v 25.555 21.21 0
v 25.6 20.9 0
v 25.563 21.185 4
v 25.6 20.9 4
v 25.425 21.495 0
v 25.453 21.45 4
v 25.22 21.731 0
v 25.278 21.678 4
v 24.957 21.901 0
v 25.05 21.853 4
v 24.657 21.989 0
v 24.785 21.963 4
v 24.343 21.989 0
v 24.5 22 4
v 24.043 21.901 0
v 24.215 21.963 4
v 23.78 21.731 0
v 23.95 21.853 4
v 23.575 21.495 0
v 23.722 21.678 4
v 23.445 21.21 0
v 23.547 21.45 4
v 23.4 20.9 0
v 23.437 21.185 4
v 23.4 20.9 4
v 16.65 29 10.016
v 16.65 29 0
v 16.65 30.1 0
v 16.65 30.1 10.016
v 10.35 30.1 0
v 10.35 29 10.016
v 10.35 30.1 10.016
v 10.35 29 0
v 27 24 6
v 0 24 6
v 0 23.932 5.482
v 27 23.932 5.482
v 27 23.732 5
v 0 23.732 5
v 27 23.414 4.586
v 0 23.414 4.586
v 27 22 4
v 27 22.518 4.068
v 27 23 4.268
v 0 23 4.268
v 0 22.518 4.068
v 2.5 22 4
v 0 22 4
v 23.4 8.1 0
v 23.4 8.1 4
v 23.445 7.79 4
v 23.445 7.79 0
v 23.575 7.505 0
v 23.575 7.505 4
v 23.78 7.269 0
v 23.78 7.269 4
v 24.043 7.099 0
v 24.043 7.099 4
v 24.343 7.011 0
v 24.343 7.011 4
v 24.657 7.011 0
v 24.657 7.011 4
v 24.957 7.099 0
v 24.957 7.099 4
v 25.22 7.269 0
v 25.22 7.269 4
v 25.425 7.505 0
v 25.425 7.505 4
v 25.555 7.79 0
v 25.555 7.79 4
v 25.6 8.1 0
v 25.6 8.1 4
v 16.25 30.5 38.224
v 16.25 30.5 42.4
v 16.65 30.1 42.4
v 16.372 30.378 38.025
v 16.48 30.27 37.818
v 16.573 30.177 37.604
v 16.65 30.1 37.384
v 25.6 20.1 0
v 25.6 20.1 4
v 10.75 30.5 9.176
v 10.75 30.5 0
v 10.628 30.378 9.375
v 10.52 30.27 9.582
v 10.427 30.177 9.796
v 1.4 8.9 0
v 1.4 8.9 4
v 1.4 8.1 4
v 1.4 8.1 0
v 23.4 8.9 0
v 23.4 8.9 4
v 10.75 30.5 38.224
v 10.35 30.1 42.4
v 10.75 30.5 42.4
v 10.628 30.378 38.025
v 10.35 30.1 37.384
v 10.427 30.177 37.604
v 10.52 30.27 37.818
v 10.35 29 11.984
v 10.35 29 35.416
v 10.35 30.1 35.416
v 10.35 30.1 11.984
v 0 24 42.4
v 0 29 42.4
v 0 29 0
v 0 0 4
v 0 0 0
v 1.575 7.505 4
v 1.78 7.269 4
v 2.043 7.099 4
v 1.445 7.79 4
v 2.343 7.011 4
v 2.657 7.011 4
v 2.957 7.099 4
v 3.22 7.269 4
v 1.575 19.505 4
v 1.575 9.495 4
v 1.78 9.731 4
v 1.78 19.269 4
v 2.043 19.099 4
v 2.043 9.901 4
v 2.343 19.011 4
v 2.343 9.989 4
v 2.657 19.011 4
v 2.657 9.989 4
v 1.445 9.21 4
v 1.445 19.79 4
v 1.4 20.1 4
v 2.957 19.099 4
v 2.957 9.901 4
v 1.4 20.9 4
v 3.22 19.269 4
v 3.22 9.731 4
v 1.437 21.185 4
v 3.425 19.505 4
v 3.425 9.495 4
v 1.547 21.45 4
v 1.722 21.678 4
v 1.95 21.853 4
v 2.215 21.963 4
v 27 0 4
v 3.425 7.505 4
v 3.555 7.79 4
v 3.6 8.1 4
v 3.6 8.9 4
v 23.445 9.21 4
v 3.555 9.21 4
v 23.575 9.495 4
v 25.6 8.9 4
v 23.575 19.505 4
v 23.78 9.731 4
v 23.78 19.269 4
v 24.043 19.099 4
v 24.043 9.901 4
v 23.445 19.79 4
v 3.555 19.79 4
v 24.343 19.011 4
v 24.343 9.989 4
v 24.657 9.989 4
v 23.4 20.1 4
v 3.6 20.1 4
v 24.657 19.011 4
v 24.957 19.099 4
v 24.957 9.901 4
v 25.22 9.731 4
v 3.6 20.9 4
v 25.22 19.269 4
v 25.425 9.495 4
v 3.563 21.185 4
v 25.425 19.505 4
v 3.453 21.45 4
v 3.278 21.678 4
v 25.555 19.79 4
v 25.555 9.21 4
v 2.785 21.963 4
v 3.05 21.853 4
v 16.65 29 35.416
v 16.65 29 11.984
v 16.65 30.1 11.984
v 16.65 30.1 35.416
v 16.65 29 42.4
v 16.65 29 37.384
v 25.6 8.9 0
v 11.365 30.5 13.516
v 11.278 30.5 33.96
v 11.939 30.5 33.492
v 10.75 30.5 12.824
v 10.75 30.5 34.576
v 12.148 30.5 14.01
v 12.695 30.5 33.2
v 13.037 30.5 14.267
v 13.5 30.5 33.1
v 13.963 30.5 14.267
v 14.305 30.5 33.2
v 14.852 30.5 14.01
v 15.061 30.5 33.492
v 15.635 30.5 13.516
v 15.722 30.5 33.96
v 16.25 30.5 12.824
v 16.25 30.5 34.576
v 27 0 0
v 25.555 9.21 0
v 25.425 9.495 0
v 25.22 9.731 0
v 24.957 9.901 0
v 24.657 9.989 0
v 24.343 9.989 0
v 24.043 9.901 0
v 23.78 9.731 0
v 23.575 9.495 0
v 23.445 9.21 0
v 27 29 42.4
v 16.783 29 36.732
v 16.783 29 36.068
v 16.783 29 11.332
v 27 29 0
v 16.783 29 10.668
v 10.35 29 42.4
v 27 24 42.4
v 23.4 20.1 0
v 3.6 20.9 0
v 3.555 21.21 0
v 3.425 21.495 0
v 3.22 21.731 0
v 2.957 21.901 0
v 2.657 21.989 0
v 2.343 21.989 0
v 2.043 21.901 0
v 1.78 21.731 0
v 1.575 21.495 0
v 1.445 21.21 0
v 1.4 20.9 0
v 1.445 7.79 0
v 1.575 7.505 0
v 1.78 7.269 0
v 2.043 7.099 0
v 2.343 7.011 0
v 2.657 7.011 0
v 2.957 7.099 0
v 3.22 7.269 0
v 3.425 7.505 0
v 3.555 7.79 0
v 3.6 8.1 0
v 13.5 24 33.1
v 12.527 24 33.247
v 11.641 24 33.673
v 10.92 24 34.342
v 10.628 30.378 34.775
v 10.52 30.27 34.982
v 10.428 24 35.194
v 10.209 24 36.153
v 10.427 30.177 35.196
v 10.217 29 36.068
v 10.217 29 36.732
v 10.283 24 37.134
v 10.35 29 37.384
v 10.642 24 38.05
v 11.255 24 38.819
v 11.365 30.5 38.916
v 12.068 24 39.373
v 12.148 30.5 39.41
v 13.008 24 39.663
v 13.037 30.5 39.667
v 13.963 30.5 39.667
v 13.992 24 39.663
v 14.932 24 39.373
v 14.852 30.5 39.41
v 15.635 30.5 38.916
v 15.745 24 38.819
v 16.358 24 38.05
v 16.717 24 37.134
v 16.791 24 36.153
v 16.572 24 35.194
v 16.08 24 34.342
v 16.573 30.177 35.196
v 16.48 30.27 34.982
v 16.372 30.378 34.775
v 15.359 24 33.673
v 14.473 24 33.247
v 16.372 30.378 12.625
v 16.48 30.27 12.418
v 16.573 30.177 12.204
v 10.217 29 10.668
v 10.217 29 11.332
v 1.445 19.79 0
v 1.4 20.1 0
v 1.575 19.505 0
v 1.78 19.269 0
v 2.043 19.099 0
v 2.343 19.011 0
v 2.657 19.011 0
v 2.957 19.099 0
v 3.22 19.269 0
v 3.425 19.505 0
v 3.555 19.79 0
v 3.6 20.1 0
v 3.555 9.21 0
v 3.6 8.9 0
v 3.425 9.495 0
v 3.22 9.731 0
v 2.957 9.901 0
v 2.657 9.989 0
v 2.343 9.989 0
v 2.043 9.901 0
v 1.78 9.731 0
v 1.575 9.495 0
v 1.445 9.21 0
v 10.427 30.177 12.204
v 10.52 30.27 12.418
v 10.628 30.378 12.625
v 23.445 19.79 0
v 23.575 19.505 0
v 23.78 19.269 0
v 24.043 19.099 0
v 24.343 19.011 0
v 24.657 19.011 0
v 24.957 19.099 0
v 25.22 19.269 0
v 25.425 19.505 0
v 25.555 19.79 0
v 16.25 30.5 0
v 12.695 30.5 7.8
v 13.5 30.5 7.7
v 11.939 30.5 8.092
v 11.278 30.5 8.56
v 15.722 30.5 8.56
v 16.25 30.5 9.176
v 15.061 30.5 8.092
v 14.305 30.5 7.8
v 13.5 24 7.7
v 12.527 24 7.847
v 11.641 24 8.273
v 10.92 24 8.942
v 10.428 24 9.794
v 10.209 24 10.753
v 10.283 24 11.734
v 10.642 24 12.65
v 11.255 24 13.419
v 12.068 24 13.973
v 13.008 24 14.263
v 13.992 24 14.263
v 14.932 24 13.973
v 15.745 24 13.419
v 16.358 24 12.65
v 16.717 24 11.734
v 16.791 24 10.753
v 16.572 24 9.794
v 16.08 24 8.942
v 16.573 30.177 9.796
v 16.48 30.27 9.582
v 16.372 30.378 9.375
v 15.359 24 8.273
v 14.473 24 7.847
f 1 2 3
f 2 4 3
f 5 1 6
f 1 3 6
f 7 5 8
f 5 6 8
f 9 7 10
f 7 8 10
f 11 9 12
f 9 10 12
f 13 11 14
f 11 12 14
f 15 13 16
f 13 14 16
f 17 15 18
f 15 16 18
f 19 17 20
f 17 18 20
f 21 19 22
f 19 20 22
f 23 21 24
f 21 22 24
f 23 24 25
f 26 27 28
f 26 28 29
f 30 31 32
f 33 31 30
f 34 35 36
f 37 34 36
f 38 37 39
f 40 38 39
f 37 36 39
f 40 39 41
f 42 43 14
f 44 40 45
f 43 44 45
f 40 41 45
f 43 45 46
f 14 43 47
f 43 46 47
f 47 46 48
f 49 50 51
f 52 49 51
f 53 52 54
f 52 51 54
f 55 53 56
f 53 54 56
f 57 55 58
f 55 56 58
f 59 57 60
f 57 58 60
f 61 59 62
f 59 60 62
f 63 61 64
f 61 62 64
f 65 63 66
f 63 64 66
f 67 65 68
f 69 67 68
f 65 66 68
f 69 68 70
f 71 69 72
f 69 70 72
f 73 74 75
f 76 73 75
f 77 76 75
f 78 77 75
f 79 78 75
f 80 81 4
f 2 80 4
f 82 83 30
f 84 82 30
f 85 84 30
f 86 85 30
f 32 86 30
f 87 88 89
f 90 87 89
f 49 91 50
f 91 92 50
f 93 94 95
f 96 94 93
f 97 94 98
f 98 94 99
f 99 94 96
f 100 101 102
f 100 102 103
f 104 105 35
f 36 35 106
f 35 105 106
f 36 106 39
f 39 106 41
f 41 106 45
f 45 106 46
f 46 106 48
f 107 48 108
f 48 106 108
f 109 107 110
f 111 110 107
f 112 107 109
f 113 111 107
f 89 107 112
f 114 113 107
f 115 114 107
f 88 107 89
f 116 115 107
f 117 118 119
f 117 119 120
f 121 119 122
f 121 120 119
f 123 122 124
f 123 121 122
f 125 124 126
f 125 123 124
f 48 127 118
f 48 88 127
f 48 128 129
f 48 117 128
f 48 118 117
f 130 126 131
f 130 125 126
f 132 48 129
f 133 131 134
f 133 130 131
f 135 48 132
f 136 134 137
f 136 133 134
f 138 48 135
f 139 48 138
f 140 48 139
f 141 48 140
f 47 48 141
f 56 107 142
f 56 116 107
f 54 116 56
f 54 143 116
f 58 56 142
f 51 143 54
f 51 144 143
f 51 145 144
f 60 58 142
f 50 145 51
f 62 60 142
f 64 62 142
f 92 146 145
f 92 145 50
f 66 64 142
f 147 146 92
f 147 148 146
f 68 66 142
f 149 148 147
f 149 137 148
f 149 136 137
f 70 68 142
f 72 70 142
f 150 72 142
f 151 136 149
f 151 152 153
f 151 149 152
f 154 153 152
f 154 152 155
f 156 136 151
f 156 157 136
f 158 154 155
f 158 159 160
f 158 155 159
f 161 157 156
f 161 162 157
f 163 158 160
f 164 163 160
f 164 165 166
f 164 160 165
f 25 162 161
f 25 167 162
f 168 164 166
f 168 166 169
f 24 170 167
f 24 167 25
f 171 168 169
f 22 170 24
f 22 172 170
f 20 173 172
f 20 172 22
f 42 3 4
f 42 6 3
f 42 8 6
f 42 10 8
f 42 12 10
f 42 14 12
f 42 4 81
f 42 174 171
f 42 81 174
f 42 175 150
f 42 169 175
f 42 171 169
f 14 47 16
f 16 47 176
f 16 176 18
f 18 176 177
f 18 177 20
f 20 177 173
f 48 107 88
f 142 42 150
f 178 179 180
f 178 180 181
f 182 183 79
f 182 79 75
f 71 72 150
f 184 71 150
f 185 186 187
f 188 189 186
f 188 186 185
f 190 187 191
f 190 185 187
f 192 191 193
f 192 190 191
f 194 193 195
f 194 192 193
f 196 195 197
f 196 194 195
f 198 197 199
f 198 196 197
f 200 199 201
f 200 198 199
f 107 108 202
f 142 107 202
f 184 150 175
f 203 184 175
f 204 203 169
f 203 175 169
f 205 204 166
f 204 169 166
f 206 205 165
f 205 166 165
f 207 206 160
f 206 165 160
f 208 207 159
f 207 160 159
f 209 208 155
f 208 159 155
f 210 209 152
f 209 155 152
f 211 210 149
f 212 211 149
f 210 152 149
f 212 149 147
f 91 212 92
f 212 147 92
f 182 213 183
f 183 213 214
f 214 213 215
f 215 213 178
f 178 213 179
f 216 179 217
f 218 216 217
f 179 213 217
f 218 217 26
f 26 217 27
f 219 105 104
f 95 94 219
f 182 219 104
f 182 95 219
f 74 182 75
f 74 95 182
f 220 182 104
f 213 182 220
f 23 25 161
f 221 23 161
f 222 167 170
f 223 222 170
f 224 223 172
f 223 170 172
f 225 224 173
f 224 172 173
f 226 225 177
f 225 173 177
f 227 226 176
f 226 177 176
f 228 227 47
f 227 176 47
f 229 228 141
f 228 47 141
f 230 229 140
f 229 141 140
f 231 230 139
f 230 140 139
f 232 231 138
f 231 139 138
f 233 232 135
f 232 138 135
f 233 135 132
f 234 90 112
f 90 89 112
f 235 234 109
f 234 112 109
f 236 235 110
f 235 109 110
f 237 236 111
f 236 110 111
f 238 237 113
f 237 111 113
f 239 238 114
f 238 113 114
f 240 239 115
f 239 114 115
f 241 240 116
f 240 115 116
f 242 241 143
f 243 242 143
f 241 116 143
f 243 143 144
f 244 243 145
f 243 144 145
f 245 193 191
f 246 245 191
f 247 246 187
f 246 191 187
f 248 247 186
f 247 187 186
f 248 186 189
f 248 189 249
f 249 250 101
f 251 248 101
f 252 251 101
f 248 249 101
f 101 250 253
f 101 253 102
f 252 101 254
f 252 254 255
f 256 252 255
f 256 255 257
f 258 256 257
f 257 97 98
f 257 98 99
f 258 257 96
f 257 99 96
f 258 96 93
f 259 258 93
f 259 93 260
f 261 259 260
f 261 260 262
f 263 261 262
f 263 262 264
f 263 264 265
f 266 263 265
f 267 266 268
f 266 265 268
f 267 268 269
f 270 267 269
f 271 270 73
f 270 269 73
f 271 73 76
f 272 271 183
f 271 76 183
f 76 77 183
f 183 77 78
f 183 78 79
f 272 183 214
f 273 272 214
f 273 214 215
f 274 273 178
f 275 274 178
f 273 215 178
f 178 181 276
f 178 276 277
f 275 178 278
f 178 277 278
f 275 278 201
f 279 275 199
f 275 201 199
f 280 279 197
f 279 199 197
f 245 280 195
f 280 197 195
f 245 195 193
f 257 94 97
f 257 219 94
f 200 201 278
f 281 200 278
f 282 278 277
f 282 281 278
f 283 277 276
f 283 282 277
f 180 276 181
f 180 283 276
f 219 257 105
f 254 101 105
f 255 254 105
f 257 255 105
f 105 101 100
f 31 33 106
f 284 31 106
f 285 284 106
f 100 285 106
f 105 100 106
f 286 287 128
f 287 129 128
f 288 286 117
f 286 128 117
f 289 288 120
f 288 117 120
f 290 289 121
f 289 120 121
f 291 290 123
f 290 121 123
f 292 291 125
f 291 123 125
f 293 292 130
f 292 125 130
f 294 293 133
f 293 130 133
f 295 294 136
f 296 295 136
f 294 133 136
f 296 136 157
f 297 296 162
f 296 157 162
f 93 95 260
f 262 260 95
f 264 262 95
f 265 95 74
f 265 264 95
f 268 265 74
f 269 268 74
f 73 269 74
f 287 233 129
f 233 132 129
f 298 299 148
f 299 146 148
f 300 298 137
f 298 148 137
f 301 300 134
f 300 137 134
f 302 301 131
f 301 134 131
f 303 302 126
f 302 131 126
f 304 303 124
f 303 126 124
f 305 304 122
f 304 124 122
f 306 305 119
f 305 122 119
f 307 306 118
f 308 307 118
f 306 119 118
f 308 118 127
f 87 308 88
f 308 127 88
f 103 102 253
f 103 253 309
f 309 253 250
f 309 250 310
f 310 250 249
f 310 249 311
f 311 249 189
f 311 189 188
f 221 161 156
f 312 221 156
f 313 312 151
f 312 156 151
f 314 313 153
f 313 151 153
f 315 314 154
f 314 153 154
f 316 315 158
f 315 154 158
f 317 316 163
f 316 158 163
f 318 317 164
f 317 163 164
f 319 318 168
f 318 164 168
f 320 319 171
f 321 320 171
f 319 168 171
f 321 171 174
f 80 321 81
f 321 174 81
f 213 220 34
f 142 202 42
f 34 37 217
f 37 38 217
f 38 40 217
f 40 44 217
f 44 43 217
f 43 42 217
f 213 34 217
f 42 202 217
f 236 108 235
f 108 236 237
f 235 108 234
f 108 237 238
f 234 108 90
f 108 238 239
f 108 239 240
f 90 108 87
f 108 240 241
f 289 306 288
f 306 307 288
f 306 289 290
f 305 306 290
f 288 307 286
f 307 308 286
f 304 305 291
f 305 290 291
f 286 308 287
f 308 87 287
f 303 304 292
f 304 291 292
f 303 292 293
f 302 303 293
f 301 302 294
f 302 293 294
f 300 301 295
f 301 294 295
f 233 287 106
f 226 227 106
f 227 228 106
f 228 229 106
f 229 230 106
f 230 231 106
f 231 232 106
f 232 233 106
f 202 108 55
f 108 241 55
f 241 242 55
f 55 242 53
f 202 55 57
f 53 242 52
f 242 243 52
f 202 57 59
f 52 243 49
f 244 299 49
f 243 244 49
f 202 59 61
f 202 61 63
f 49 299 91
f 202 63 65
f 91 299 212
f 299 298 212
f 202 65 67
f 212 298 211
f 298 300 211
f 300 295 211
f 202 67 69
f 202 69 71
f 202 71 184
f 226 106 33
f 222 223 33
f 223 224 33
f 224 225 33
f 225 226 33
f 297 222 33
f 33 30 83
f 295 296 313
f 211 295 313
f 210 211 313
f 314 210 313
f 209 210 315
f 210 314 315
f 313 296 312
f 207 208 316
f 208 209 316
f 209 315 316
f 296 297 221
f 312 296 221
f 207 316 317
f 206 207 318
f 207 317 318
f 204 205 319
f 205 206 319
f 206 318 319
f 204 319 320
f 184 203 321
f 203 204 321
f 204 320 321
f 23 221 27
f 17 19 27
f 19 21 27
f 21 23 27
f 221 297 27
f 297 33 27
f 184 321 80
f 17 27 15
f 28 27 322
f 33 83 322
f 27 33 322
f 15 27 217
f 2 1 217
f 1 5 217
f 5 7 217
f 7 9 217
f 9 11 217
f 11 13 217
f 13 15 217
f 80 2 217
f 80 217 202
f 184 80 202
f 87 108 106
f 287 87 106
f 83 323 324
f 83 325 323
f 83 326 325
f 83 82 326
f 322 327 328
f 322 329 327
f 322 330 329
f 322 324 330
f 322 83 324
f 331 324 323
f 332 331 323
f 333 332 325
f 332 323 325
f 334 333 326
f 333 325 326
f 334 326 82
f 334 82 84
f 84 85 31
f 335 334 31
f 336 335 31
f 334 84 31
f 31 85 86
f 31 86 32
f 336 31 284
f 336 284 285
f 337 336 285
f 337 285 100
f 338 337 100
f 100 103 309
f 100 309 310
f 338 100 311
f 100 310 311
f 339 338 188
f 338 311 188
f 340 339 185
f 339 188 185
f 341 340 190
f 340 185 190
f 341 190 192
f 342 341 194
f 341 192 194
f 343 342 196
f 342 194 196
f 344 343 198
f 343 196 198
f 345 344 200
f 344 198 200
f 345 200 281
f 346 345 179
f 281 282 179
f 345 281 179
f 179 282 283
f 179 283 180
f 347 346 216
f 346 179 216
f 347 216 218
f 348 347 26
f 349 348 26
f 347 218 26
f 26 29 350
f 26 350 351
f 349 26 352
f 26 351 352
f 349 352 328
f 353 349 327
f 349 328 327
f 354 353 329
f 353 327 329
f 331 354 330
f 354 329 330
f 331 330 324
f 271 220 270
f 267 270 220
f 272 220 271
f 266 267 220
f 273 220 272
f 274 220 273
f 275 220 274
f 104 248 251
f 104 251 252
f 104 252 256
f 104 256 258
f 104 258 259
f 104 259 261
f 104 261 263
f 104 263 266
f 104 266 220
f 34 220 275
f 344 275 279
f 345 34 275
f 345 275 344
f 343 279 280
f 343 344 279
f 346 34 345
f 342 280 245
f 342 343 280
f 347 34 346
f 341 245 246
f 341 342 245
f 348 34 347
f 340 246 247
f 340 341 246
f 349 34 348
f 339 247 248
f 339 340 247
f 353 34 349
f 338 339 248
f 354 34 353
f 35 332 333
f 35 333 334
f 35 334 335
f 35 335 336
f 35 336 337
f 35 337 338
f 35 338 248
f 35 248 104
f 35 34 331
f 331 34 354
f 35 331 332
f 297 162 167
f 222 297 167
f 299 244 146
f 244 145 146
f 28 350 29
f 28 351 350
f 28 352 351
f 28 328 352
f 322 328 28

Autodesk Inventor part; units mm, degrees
ref_plane "YZ Plane" through (0, 0, 0) normal (1, 0, 0) x (0, 1, 0)
ref_plane "XZ Plane" through (0, 0, 0) normal (0, 1, 0) x (-1, 0, 0)
ref_plane "XY Plane" through (0, 0, 0) normal (0, 0, 1) x (1, 0, 0)
sketch "Sketch1" plane through (0, 0, 0) normal (0, 0, 1) x (1, 0, 0)
  line L0 (0, 0) -> (27, 0)
  line L1 (27, 0) -> (27, 29)
  line L2 (27, 29) -> (0, 29)
  line L3 (0, 29) -> (0, 0)
  dimension "d0" = 27
  dimension "d1" = 29
extrude "Extrusion1" add sketch "Sketch1" along normal blind 4
sketch "Sketch2" plane through (0, 0, 4) normal (0, 0, 1) x (1, 0, 0)
  line L0 (27, 29) -> (0, 29) projected
  point P0 (0, 0)
  point P1 (2.5, 20.5)
  point P2 (24.5, 20.5)
  point P3 (2.5, 8.5)
  point P4 (24.5, 8.5)
  dimension "d30" = 8.5
  dimension "d31" = 12
  dimension "d32" = 8.5
  dimension "d33" = 12
sketch "Sketch3" plane through (0, 0, 0) normal (0, 0, -1) x (-1, 0, 0)
  line L0 (0, 29) -> (0, 0) projected
  point P0 (-13.5, 33)
  point P1 (-13.5, 5)
  dimension "d19" = 13.5
  dimension "d20" = 13.5
sketch "Sketch6" plane through (0, 0, 4) normal (0, 0, 1) x (1, 0, 0)
  line L0 (0, 29) -> (0, 0) projected
  line L1 (27, 0) -> (27, 29) projected
  line L2 (0, 29) -> (27, 29)
  line L3 (27, 29) -> (27, 24)
  line L4 (27, 24) -> (0, 24)
  line L5 (0, 24) -> (0, 29)
  dimension "d34" = 5
extrude "Extrusion4" add sketch "Sketch6" along normal blind 38.4
sketch "Sketch8" plane through (0, 29, 0) normal (0, 1, 0) x (1, 0, 0)
  line L0 (0, 0) -> (27, 0) projected
  line L1 (0, -42.4) -> (27, -42.4) projected
  line L2 (10.35, 0) -> (16.65, 0)
  line L3 (16.65, 0) -> (16.65, -42.4)
  line L4 (16.65, -42.4) -> (10.35, -42.4)
  line L5 (10.35, -42.4) -> (10.35, 0)
  line L6 (0, 0) -> (0, -42.4) projected
  dimension "d41" = 6.3
  dimension "d51" = 10.35
extrude "Extrusion6" add sketch "Sketch8" along normal blind 1.5 contours L0 L3 L1 L5
sketch "Sketch9" plane through (0, 24, 4) normal (0, -1, 0) x (1, 0, 0)
  line L0 (0, 0) -> (27, 0) projected
  point P0 (0, -4)
  point P1 (13.5, 7)
  point P2 (13.5, 20)
  dimension "d69" = 7
hole "Hole3" at (13.5, 24, 11) direction (0, 1, 0) diameter 6.6 end through all
fillet "Fillet1" radius 2 1 edges at (13.5, 24, 4)
sketch "Sketch10" plane through (0, 0, 4) normal (0, 0, 1) x (1, 0, 0)
  line L0 (24.5, 20.9) -> (24.5, 20.1) construction
  line L1 (23.4, 20.9) -> (23.4, 20.1)
  line L2 (25.6, 20.1) -> (25.6, 20.9)
  arc A0 (25.6, 20.9) -> (23.4, 20.9) centre (24.5, 20.9) ccw
  arc A1 (23.4, 20.1) -> (25.6, 20.1) centre (24.5, 20.1) ccw
  line L3 (24.5, 8.9) -> (24.5, 8.1) construction
  line L4 (23.4, 8.9) -> (23.4, 8.1)
  line L5 (25.6, 8.1) -> (25.6, 8.9)
  arc A2 (25.6, 8.9) -> (23.4, 8.9) centre (24.5, 8.9) ccw
  arc A3 (23.4, 8.1) -> (25.6, 8.1) centre (24.5, 8.1) ccw
  line L6 (2.5, 20.9) -> (2.5, 20.1) construction
  line L7 (1.4, 20.9) -> (1.4, 20.1)
  line L8 (3.6, 20.1) -> (3.6, 20.9)
  arc A4 (3.6, 20.9) -> (1.4, 20.9) centre (2.5, 20.9) ccw
  arc A5 (1.4, 20.1) -> (3.6, 20.1) centre (2.5, 20.1) ccw
  line L9 (2.5, 8.1) -> (2.5, 8.9) construction
  line L10 (3.6, 8.1) -> (3.6, 8.9)
  line L11 (1.4, 8.9) -> (1.4, 8.1)
  arc A6 (1.4, 8.1) -> (3.6, 8.1) centre (2.5, 8.1) ccw
  arc A7 (3.6, 8.9) -> (1.4, 8.9) centre (2.5, 8.9) ccw
  point P0 (0, 0)
  point P1 (24.5, 20.5)
  point P2 (24.5, 8.5)
  point P3 (2.5, 20.5)
  point P4 (2.5, 8.5)
  dimension "d53" = 0.4
  dimension "d54" = 2.2
  dimension "d55" = 0.4
  dimension "d56" = 2.2
  dimension "d57" = 0.4
  dimension "d58" = 2.2
  dimension "d59" = 0.4
  dimension "d60" = 2.2
extrude "Extrusion7" cut sketch "Sketch10" against normal through all
chamfer "Chamfer1" distance 0.4 angle 45 1 edges at (16.65, 30.5, 27.1918)
chamfer "Chamfer2" distance 0.4 angle 45 3 edges at (16.65, 30.5, 5.0082) (10.35, 30.5, 27.1918) (10.35, 30.5, 5.0082)
sketch "Sketch11" plane through (0, 24, 42.4) normal (0, -1, 0) x (1, 0, 0)
  point P0 (0, -42.4)
  point P1 (13.5, -6)
hole "Hole4" at (13.5, 24, 36.4) direction (0, 1, 0) diameter 6.6 end through all
properties part number "CameraMountA"
